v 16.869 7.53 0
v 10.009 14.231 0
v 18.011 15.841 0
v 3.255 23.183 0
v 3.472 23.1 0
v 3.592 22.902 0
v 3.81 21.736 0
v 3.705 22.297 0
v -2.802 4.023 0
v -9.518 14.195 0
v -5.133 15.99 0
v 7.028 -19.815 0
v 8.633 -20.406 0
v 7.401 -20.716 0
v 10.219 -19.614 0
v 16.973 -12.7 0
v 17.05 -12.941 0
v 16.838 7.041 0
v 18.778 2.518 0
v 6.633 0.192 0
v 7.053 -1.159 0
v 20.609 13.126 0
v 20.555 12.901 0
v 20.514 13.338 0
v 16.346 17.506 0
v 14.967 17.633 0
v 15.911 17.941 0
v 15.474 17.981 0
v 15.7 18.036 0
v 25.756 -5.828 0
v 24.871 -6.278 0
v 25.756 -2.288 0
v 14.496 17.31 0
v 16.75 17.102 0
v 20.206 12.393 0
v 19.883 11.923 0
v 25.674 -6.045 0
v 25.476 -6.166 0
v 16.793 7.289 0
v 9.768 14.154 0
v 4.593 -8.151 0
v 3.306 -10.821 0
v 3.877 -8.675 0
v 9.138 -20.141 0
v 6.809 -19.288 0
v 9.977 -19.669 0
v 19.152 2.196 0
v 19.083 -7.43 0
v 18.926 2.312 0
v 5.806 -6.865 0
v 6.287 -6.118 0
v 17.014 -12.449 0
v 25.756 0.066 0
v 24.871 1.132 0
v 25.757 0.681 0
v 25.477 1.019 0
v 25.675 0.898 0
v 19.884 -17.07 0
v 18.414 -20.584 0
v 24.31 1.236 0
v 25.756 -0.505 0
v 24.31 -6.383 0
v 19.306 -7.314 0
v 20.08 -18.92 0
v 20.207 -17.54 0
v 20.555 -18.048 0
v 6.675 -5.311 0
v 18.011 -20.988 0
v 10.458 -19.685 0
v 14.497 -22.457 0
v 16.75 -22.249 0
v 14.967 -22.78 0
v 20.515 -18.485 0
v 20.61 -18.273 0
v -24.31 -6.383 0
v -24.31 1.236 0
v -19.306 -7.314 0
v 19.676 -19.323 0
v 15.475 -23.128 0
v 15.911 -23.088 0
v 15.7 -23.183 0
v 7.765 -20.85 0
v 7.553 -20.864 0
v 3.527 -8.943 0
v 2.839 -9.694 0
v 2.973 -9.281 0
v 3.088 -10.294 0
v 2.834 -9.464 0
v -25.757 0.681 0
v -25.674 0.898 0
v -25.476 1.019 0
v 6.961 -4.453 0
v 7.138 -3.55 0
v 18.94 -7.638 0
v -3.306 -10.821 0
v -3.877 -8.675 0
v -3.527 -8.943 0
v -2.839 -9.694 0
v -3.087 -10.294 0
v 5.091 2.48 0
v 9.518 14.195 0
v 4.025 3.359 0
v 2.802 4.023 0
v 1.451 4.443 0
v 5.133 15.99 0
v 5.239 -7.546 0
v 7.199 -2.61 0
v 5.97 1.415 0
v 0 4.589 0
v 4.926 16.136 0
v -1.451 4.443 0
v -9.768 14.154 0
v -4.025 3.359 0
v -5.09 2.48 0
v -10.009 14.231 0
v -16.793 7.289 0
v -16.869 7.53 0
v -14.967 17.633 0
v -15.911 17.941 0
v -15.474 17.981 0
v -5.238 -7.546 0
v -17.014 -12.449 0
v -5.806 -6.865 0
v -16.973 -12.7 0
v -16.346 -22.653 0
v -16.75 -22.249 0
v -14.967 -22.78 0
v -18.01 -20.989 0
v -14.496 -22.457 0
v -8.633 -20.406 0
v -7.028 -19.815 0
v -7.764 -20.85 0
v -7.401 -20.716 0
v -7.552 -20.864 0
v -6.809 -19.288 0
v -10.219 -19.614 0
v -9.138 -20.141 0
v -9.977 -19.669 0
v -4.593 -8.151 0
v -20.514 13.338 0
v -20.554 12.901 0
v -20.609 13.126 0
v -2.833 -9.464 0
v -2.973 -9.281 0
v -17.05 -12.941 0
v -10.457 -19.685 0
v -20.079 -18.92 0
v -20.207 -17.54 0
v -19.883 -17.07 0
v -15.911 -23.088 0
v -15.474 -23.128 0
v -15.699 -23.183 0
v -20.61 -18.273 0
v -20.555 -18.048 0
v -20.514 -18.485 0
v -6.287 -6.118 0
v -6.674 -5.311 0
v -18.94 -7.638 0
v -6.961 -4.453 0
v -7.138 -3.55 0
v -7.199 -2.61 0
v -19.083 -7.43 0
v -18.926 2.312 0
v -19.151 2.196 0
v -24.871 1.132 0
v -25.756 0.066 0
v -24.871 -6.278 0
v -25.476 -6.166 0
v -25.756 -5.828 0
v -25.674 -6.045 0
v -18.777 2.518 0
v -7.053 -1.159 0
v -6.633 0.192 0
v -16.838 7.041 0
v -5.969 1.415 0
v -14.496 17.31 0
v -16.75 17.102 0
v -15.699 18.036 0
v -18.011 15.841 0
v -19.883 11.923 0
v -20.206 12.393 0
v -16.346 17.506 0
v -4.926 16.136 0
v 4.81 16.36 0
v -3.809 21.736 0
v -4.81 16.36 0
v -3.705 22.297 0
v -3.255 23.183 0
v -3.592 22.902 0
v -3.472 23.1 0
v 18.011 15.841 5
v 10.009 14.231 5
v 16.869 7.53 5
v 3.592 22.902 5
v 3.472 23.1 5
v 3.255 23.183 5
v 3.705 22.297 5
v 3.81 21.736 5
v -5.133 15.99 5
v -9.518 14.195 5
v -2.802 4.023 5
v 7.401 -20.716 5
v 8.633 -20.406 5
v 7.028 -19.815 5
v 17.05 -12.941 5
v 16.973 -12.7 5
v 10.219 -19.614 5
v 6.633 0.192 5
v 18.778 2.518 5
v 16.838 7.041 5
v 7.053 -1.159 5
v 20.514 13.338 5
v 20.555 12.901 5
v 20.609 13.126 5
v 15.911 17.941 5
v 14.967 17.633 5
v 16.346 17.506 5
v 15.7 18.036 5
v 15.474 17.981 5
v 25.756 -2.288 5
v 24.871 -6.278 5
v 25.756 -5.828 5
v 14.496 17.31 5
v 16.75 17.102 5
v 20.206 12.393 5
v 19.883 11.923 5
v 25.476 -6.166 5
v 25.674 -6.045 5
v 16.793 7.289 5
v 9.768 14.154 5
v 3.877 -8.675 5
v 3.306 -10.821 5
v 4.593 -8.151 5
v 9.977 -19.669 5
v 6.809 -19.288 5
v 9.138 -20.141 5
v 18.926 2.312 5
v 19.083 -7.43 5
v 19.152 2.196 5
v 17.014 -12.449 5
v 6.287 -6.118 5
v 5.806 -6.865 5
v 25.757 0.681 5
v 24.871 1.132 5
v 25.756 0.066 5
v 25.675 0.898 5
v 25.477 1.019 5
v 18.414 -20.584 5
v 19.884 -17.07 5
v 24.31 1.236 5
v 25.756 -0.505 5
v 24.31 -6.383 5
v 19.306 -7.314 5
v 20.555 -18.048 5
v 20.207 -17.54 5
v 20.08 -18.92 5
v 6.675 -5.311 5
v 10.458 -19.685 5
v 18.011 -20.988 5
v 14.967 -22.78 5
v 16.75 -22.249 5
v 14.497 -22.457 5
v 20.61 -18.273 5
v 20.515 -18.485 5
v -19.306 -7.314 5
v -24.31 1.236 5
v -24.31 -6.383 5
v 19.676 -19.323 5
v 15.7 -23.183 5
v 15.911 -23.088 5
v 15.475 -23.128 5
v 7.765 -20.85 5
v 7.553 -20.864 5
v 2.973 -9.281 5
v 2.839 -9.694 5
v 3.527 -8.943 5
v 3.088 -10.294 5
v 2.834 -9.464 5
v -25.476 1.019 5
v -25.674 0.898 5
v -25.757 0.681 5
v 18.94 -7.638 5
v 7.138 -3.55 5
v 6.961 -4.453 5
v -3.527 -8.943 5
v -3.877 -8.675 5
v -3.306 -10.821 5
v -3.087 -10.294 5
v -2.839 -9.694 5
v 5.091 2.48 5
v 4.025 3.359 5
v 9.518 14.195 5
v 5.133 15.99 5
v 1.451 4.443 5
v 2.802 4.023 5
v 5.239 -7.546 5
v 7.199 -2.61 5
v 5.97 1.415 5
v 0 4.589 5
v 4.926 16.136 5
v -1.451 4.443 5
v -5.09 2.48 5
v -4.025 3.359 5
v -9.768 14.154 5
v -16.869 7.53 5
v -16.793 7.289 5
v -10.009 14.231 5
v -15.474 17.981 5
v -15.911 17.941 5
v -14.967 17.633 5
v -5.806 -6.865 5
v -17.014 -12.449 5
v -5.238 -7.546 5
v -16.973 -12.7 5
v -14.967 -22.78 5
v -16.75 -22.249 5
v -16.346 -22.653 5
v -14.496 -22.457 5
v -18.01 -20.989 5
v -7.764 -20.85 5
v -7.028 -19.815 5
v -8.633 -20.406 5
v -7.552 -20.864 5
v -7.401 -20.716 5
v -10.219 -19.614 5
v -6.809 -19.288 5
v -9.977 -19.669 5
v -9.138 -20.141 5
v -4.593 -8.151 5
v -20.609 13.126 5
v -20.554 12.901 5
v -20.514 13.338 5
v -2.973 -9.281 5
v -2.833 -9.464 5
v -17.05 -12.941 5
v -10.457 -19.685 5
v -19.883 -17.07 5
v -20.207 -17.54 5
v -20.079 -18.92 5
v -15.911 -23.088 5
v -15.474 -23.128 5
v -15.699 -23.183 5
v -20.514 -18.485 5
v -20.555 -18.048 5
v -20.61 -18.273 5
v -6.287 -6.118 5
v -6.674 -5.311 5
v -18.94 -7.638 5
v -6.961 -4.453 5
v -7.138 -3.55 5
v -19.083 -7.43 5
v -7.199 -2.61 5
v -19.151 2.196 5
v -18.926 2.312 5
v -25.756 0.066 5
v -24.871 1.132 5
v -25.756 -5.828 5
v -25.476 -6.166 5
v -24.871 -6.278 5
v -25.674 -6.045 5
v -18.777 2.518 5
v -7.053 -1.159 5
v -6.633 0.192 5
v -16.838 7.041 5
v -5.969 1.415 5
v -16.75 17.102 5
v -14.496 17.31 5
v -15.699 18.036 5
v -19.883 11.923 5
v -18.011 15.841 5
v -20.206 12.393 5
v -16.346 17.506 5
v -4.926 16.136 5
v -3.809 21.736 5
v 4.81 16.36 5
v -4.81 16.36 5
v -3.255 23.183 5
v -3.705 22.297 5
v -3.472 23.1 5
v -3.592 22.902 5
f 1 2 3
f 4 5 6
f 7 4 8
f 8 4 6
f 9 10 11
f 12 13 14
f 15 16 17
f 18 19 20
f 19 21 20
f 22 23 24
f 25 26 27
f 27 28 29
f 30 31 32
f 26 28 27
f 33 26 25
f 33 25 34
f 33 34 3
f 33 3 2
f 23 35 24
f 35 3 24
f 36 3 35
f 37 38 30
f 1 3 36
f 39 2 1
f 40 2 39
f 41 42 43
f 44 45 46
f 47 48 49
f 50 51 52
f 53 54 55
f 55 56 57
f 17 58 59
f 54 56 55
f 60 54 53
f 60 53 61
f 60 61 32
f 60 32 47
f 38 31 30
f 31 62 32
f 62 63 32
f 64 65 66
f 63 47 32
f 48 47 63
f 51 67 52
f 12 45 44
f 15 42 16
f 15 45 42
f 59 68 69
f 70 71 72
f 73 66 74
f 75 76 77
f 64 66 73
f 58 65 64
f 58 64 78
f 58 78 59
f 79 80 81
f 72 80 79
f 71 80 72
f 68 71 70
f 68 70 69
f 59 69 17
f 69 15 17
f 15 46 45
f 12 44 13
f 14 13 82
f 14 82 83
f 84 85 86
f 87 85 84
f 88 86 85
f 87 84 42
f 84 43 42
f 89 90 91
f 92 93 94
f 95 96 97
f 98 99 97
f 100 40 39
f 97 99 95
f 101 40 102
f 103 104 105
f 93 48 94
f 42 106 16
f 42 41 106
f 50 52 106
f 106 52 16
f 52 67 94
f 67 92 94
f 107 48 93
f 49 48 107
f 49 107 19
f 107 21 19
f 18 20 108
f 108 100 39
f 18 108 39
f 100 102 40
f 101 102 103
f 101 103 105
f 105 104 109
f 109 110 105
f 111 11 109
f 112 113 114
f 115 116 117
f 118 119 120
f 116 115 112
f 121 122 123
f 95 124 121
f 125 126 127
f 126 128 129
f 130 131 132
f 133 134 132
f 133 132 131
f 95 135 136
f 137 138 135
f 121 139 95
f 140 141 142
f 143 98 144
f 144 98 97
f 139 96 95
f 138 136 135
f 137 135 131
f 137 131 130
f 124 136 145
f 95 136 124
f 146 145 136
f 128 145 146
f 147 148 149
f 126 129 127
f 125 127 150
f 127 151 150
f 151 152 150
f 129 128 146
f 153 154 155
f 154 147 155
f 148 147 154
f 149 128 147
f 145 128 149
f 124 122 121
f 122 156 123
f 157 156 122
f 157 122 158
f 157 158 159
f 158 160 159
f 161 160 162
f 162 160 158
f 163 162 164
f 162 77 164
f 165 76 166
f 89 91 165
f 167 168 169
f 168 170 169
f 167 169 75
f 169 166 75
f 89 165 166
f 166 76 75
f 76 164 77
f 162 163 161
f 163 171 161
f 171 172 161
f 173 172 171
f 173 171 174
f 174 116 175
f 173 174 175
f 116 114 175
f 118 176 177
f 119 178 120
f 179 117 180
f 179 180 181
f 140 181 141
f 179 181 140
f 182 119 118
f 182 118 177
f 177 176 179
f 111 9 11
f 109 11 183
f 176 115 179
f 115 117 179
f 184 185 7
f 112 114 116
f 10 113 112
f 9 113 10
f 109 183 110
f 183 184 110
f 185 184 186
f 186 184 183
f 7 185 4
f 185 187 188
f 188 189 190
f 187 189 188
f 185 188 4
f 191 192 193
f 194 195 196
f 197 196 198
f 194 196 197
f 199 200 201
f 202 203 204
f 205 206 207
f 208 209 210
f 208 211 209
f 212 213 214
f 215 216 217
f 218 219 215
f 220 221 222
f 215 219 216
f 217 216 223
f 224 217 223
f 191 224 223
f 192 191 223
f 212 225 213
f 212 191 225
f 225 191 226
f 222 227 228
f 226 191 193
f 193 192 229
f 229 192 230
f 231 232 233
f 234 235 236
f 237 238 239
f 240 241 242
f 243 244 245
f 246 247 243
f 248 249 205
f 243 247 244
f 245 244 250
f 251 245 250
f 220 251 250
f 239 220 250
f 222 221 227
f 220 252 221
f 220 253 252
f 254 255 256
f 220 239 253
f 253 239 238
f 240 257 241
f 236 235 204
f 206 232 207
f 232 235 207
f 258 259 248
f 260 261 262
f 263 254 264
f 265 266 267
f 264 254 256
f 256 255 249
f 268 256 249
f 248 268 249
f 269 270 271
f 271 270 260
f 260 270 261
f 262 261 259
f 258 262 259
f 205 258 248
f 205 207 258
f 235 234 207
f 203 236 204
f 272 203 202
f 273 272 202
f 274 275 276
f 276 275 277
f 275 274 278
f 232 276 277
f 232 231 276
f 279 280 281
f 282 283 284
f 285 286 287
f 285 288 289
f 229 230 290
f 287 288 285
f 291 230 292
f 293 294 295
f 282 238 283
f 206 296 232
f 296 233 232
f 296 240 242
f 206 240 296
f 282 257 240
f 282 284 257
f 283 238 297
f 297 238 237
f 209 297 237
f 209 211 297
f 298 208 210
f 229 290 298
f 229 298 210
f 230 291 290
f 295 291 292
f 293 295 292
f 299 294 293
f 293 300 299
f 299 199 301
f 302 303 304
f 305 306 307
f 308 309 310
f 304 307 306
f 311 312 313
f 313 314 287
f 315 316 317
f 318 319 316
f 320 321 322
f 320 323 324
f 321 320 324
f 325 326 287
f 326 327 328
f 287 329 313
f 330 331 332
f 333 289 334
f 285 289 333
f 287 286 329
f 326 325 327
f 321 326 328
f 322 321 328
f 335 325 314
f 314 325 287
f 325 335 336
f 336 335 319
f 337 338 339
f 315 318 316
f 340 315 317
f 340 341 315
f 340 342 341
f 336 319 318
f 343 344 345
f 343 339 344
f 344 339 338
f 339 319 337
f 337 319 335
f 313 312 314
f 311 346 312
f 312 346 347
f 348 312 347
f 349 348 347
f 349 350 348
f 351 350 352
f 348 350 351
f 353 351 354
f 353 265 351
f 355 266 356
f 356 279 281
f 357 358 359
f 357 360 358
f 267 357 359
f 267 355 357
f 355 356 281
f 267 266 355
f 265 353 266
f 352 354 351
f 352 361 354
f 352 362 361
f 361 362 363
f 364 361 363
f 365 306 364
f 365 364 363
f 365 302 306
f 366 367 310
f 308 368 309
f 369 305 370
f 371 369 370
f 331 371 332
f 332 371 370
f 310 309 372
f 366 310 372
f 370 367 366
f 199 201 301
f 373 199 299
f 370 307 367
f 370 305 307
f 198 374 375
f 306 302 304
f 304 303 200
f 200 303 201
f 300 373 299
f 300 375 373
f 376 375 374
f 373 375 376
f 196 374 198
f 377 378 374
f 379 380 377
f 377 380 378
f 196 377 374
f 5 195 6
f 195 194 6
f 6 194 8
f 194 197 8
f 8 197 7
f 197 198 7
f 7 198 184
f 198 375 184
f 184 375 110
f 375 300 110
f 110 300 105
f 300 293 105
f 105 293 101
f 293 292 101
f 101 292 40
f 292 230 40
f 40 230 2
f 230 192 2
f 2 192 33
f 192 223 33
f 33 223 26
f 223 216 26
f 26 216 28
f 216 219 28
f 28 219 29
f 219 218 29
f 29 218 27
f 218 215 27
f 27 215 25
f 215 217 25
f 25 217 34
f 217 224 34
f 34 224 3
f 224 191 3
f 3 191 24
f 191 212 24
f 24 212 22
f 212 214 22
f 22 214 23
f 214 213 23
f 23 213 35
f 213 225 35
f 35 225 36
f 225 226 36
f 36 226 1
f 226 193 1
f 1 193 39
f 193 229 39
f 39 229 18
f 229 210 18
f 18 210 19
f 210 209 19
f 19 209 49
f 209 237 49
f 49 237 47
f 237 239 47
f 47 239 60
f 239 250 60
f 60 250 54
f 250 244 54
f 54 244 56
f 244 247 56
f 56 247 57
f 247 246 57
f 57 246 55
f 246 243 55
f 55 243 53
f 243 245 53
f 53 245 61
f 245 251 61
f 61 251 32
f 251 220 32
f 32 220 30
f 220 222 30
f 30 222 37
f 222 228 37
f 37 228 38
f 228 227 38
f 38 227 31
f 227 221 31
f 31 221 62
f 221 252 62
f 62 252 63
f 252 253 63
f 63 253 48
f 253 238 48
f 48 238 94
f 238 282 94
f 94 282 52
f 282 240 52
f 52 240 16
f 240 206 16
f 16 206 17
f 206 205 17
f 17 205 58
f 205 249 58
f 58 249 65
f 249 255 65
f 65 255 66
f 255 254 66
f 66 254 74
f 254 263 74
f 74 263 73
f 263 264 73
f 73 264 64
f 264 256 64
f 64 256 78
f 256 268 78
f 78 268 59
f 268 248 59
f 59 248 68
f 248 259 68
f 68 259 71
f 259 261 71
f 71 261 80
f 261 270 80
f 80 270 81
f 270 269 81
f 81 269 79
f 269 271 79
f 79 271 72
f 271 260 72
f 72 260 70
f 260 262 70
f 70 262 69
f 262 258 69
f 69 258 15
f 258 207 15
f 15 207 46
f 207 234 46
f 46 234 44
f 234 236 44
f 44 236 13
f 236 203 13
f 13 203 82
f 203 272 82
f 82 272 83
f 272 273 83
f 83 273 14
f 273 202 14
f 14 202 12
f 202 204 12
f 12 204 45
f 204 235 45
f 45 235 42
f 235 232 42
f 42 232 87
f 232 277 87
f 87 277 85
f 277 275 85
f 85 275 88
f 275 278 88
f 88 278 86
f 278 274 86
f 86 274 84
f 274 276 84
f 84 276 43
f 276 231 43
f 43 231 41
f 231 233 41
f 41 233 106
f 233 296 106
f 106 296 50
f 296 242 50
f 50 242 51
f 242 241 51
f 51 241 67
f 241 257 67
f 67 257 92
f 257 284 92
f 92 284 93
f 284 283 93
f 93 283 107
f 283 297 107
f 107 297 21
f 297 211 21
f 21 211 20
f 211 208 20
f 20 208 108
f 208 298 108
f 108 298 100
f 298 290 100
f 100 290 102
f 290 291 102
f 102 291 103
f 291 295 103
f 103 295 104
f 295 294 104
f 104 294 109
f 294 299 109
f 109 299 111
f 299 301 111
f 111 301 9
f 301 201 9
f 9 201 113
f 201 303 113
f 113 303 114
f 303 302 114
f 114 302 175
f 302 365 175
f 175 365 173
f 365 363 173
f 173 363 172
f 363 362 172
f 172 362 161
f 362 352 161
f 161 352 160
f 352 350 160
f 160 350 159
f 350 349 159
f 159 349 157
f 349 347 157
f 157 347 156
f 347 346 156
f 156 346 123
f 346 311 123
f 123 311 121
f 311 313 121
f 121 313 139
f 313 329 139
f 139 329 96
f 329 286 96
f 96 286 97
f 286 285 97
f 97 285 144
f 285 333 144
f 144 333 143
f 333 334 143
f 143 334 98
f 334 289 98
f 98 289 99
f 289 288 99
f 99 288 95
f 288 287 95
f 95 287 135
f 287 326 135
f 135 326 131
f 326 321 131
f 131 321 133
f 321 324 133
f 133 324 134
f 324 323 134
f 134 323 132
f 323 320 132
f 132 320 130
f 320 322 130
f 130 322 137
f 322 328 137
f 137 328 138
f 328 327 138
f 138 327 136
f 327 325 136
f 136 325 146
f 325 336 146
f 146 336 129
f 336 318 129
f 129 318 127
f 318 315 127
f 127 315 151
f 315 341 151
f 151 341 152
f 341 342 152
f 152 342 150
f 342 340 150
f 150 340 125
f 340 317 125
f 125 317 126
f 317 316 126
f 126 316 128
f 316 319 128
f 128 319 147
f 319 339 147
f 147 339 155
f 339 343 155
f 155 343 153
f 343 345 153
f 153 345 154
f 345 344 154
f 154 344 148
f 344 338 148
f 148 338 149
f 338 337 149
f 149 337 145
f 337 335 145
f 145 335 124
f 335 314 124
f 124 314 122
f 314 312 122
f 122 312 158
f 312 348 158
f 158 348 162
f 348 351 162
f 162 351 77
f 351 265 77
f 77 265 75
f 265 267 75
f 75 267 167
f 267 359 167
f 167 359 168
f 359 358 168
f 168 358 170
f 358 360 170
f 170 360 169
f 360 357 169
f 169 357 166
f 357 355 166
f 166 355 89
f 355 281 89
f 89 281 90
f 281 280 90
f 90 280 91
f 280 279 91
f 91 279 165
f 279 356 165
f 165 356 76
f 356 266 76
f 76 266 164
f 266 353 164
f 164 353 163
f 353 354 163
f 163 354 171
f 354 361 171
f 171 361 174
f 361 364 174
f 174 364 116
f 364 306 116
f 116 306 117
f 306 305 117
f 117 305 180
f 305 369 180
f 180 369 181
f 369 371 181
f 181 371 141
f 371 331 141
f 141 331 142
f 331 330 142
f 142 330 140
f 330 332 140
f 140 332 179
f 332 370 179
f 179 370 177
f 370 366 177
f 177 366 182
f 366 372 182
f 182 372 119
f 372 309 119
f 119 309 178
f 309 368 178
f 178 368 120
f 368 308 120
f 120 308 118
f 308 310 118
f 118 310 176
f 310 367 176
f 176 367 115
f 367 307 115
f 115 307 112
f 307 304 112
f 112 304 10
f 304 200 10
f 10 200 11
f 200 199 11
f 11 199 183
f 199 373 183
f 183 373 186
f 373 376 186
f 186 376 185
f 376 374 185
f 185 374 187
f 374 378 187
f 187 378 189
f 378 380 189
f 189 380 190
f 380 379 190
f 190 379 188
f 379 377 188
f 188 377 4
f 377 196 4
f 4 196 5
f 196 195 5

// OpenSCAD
// Module names are of the form poly_<inkscape-path-id>().  As a result,
// you can associate a polygon in this OpenSCAD program with the corresponding
// SVG element in the Inkscape document by looking for the XML element with
// the attribute id="inkscape-path-id".

// fudge value is used to ensure that subtracted solids are a tad taller
// in the z dimension than the polygon being subtracted from.  This helps
// keep the resulting .stl file manifold.
fudge = 0.1;

module oh_gear(h)
{
  scale([25.4/90, -25.4/90, 1]) union()
  {
    linear_extrude(height=h)
      polygon([[90.271109,-3.611868],[88.127335,-4.011298],[86.138276,-4.380391],[67.860576,-7.780094],[67.060832,-8.191532],[66.534874,-8.920744],[59.663672,-24.947481],[59.503900,-25.826985],[59.771872,-26.680702],[70.453330,-42.245314],[71.597013,-43.913818],[72.831706,-45.711757],[73.024089,-46.510111],[72.687102,-47.259927],[71.146012,-48.801017],[69.716154,-50.230875],[65.247598,-54.699431],[63.817741,-56.129288],[59.351207,-60.597845],[57.920338,-62.028713],[56.378236,-63.569804],[55.628800,-63.907044],[54.830067,-63.713396],[53.032128,-62.479715],[51.364635,-61.335020],[35.466323,-50.424016],[34.611214,-50.150736],[33.725011,-50.297615],[18.187702,-56.657142],[17.456089,-57.173746],[17.043007,-57.968687],[13.498701,-77.017944],[13.129608,-79.005991],[12.729167,-81.149766],[12.301802,-81.851043],[11.533911,-82.142779],[9.353733,-82.142779],[7.331304,-82.142779],[1.011214,-82.142779],[-1.011214,-82.142779],[-7.331304,-82.142779],[-9.353733,-82.142779],[-11.532900,-82.142779],[-12.301170,-81.850917],[-12.728156,-81.148755],[-13.127585,-79.005991],[-13.496679,-77.017944],[-17.041996,-57.968687],[-17.454319,-57.173746],[-18.186691,-56.657142],[-33.724000,-50.297615],[-34.610203,-50.150736],[-35.465311,-50.424016],[-51.363624,-61.335020],[-53.031117,-62.479715],[-54.829056,-63.713396],[-55.627789,-63.907044],[-56.377225,-63.569804],[-57.919327,-62.028713],[-59.349184,-60.597845],[-63.817741,-56.128277],[-65.247598,-54.698420],[-69.715143,-50.230875],[-71.145000,-48.801017],[-72.686091,-47.259927],[-73.023331,-46.510111],[-72.829684,-45.711757],[-71.596002,-43.913818],[-70.452318,-42.245314],[-59.770861,-26.680702],[-59.503268,-25.826985],[-59.662661,-24.947481],[-66.532851,-8.920744],[-67.059694,-8.191532],[-67.859565,-7.780094],[-86.137265,-4.380391],[-88.126324,-4.011298],[-90.270098,-3.611868],[-90.972260,-3.183493],[-91.264122,-2.414590],[-91.263111,-0.234412],[-91.263111,1.788017],[-91.263111,8.108107],[-91.263111,10.130535],[-91.263111,16.448603],[-91.263111,18.471032],[-91.263111,20.650199],[-90.970743,21.418975],[-90.268076,21.846466],[-88.125313,22.244884],[-86.136254,22.616000],[-68.408654,25.914581],[-67.616873,26.328294],[-67.110255,27.064332],[-60.286580,44.112395],[-60.140712,44.998725],[-60.415004,45.854718],[-70.453330,60.482945],[-71.598024,62.149427],[-72.832717,63.949388],[-73.025986,64.747742],[-72.689125,65.497558],[-71.147023,67.038648],[-69.717166,68.468505],[-65.246587,72.939084],[-63.816730,74.368941],[-59.350196,78.834464],[-57.920338,80.265333],[-56.377225,81.806423],[-55.627789,82.142779],[-54.829056,81.949005],[-53.032128,80.716334],[-51.364635,79.572651],[-37.053929,69.751736],[-36.209565,69.499059],[-35.350033,69.693086],[-32.379085,71.365635],[-30.588224,72.303030],[-27.511099,73.878502],[-26.760778,73.928810],[-26.222812,73.404243],[-24.902166,70.210828],[-24.127576,68.342104],[-11.712896,38.340384],[-10.938306,36.473682],[-10.059561,34.348109],[-10.039337,33.533702],[-10.534832,32.886904],[-12.496588,31.686593],[-13.736336,30.737063],[-16.274159,28.882444],[-18.561457,26.736477],[-20.571152,24.326062],[-22.276168,21.678098],[-23.649427,18.819486],[-24.663851,15.777125],[-25.292362,12.577915],[-25.507883,9.248757],[-24.989638,4.107806],[-23.503293,-0.680484],[-21.151435,-5.013538],[-18.036652,-8.788780],[-14.261530,-11.903637],[-9.928656,-14.255532],[-5.140617,-15.741891],[-0.000000,-16.260138],[5.140951,-15.741891],[9.929241,-14.255532],[14.262294,-11.903637],[18.037537,-8.788780],[21.152393,-5.013538],[23.504288,-0.680484],[24.990647,4.107806],[25.508894,9.248757],[25.293330,12.578206],[24.664704,15.777552],[23.650118,18.819930],[22.276674,21.678478],[20.571472,24.326329],[18.561615,26.736619],[16.274202,28.882485],[13.736336,30.737063],[12.496588,31.686593],[10.535843,32.886904],[10.041106,33.533702],[10.060572,34.348109],[10.940329,36.473682],[11.712896,38.340384],[24.127576,68.342104],[24.901155,70.210828],[26.223823,73.404243],[26.761789,73.928810],[27.512110,73.878502],[30.588224,72.303030],[32.380096,71.365635],[35.350033,69.693086],[36.210450,69.499059],[37.054940,69.751736],[51.365647,79.572651],[53.032128,80.716334],[54.831078,81.949005],[55.629811,82.142779],[56.379248,81.806423],[57.920338,80.265333],[59.351207,78.834464],[63.817741,74.366919],[65.247598,72.937062],[69.718177,68.468505],[71.148034,67.038648],[72.691147,65.497558],[73.027502,64.748121],[72.833728,63.949388],[71.599036,62.149427],[70.454341,60.482945],[60.415004,45.854718],[60.141092,44.999104],[60.286580,44.112395],[67.110255,27.064332],[67.617632,26.328294],[68.408654,25.914581],[86.137265,22.616000],[88.126324,22.244884],[90.268076,21.846466],[90.970238,21.418975],[91.262100,20.650199],[91.262100,18.471032],[91.262100,16.448603],[91.262100,10.130535],[91.262100,8.108107],[91.263111,1.788017],[91.263111,-0.234412],[91.264122,-2.414590],[90.973145,-3.183493],[90.271109,-3.611868]]);
  }
}

oh_gear(5);
